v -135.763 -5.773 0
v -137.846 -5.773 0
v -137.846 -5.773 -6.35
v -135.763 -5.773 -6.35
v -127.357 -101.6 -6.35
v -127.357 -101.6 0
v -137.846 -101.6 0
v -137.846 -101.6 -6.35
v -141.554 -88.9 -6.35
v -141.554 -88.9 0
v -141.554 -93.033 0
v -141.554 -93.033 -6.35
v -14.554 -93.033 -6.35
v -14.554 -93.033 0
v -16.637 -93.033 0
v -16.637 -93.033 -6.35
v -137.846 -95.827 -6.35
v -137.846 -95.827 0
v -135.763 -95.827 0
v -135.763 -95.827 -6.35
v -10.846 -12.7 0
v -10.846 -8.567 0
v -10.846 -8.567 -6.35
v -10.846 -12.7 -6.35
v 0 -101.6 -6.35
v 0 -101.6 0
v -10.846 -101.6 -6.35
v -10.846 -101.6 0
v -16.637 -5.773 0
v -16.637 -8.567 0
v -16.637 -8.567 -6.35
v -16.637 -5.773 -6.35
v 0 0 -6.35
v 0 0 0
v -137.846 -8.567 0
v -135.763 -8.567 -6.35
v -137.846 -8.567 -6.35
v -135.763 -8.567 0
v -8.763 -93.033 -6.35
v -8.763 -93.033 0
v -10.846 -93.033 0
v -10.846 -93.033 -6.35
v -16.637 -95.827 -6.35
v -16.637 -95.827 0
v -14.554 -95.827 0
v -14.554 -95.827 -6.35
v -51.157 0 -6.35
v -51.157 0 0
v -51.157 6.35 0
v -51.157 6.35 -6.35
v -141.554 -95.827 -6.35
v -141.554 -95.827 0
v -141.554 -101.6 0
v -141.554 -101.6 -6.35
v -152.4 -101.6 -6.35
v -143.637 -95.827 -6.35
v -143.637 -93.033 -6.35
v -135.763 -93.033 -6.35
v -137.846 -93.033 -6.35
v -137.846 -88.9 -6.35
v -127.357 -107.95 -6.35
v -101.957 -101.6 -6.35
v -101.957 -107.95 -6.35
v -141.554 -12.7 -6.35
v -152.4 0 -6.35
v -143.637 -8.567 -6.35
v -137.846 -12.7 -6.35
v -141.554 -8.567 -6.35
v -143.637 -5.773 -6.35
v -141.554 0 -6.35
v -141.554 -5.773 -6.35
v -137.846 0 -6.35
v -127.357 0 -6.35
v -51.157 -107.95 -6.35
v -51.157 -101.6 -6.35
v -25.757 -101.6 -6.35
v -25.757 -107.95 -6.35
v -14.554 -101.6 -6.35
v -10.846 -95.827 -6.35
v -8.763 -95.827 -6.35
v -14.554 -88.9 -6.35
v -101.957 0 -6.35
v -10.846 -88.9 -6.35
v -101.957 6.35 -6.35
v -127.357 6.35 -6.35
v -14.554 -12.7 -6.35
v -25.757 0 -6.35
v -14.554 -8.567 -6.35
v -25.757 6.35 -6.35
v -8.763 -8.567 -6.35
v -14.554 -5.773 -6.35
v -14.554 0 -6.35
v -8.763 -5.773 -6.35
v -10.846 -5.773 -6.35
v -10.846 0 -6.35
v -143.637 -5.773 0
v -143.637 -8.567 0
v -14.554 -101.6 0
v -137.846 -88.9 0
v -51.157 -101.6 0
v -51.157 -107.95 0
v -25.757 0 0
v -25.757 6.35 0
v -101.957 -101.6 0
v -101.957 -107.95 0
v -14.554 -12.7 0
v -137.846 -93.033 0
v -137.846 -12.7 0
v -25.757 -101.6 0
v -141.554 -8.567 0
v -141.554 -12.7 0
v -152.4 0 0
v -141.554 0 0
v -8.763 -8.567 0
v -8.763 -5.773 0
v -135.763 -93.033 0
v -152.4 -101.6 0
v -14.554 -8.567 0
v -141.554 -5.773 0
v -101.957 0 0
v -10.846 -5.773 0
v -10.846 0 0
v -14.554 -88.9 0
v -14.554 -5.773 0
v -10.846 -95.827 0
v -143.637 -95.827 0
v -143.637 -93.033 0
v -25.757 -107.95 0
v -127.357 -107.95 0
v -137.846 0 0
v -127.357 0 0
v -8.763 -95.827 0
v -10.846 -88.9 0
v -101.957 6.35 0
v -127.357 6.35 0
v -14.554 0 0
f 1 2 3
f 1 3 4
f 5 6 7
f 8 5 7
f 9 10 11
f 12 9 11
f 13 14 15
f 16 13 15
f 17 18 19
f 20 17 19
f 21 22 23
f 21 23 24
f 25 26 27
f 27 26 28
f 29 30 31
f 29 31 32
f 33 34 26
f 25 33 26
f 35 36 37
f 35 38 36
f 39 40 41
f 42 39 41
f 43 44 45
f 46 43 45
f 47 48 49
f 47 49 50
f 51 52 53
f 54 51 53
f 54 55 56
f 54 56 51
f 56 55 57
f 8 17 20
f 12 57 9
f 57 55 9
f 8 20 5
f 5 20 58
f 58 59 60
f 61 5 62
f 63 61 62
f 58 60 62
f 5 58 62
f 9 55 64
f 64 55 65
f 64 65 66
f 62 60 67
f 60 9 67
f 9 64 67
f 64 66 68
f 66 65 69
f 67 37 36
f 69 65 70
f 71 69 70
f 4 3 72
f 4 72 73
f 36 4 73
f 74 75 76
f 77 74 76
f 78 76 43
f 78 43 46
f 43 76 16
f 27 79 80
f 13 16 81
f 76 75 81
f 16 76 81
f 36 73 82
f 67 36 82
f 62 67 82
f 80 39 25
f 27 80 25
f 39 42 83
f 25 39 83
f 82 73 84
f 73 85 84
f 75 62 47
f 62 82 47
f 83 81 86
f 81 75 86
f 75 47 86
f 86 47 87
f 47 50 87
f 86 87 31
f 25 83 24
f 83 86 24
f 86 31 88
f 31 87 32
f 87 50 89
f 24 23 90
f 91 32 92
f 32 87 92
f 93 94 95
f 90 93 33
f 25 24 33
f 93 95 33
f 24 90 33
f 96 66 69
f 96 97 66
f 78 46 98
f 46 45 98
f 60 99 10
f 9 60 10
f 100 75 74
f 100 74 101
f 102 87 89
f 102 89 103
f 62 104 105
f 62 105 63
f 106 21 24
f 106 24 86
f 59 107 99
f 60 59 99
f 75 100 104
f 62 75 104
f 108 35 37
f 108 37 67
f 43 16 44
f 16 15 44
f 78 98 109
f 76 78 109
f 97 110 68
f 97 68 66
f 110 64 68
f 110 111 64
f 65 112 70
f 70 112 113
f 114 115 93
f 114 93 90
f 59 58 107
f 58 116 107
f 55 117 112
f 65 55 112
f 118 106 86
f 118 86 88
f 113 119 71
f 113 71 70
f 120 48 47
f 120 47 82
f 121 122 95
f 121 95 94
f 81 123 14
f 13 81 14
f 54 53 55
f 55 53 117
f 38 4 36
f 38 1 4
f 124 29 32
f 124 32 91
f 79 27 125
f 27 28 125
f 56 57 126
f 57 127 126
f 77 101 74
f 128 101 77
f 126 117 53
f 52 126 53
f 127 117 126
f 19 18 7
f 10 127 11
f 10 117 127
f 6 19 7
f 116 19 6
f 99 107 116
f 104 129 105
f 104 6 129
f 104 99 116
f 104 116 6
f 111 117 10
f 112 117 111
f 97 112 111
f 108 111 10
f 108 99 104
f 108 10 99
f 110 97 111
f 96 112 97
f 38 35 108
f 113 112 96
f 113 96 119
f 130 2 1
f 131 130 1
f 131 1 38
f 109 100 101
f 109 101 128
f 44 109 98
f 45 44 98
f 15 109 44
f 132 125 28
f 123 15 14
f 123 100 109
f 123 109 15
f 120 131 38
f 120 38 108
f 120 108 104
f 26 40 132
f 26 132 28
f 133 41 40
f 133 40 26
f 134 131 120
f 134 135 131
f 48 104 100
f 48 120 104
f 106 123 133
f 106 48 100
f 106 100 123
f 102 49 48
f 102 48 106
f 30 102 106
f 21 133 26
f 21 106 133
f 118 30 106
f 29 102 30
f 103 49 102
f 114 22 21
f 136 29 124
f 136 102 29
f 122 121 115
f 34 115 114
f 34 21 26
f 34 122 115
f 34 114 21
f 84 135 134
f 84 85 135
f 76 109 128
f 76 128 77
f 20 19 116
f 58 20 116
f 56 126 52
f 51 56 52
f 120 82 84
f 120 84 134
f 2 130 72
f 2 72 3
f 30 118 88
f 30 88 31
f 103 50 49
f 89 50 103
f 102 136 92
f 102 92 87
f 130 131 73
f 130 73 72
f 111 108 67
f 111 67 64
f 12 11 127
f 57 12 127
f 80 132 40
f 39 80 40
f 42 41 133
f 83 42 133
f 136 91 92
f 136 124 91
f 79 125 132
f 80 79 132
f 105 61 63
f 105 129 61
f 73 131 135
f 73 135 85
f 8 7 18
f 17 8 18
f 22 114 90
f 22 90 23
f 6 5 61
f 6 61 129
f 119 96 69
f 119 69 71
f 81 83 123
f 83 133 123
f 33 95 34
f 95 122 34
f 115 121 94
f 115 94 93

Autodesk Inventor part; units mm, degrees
ref_plane "YZ Plane" through (0, 0, 0) normal (1, 0, 0) x (0, 1, 0)
ref_plane "Work Plane1" through (0, 0, 0) normal (0, 0, 1) x (1, 0, 0)
sketch "Sketch1" plane through (0, 0, 0) normal (0, 0, 1) x (1, 0, 0)
  line L0 (-77.8391, 0) -> (-108.8361, 0) projected
  line L1 (-108.8361, -33.02) -> (-108.8361, 0) projected
  line L2 (-77.8391, -33.02) -> (-108.8361, -33.02) projected
  line L3 (-77.8391, -33.02) -> (-77.8391, 0) projected
  line L4 (-152.4, 0) -> (0, 0) construction
  line L5 (-152.4, 0) -> (-152.4, 6.35) construction
  line L6 (0, 0) -> (0, 6.35) construction
  line L7 (-152.4, 0) -> (0, 0)
  line L8 (0, 0) -> (0, -101.6)
  line L9 (0, -101.6) -> (-152.4, -101.6)
  line L10 (-152.4, -101.6) -> (-152.4, 0)
  line L11 (-137.8458, 6.35) -> (-137.8458, 0)
  line L12 (-141.5542, 6.35) -> (-141.5542, 0)
  line L13 (-14.5542, 6.35) -> (-14.5542, 0)
  line L14 (-10.8458, 6.35) -> (-10.8458, 0)
  line L15 (-141.5542, 0) -> (-137.8458, 0)
  line L16 (-137.8458, 0) -> (-137.8458, -12.7)
  line L17 (-137.8458, -12.7) -> (-141.5542, -12.7)
  line L18 (-141.5542, -12.7) -> (-141.5542, 0)
  line L19 (-14.5542, 0) -> (-10.8458, 0)
  line L20 (-10.8458, 0) -> (-10.8458, -12.7)
  line L21 (-10.8458, -12.7) -> (-14.5542, -12.7)
  line L22 (-14.5542, -12.7) -> (-14.5542, 0)
  line L23 (-16.637, -5.7726) -> (-8.763, -5.7726)
  line L24 (-8.763, -5.7726) -> (-8.763, -8.5666)
  line L25 (-8.763, -8.5666) -> (-16.637, -8.5666)
  line L26 (-16.637, -8.5666) -> (-16.637, -5.7726)
  line L27 (-143.637, -5.7726) -> (-135.763, -5.7726)
  line L28 (-135.763, -5.7726) -> (-135.763, -8.5666)
  line L29 (-135.763, -8.5666) -> (-143.637, -8.5666)
  line L30 (-143.637, -8.5666) -> (-143.637, -5.7726)
  line L31 (-152.4, -50.8) -> (0, -50.8) construction
  line L32 (-137.8458, -107.95) -> (-137.8458, -101.6)
  line L33 (-141.5542, -107.95) -> (-141.5542, -101.6)
  line L34 (-14.5542, -107.95) -> (-14.5542, -101.6)
  line L35 (-10.8458, -107.95) -> (-10.8458, -101.6)
  line L36 (-141.5542, -101.6) -> (-137.8458, -101.6)
  line L37 (-137.8458, -101.6) -> (-137.8458, -88.9)
  line L38 (-137.8458, -88.9) -> (-141.5542, -88.9)
  line L39 (-141.5542, -88.9) -> (-141.5542, -101.6)
  line L40 (-14.5542, -101.6) -> (-10.8458, -101.6)
  line L41 (-10.8458, -101.6) -> (-10.8458, -88.9)
  line L42 (-10.8458, -88.9) -> (-14.5542, -88.9)
  line L43 (-14.5542, -88.9) -> (-14.5542, -101.6)
  line L44 (-16.637, -95.8274) -> (-8.763, -95.8274)
  line L45 (-8.763, -95.8274) -> (-8.763, -93.0334)
  line L46 (-8.763, -93.0334) -> (-16.637, -93.0334)
  line L47 (-16.637, -93.0334) -> (-16.637, -95.8274)
  line L48 (-143.637, -95.8274) -> (-135.763, -95.8274)
  line L49 (-135.763, -95.8274) -> (-135.763, -93.0334)
  line L50 (-135.763, -93.0334) -> (-143.637, -93.0334)
  line L51 (-143.637, -93.0334) -> (-143.637, -95.8274)
  dimension "d0" = 101.6
  dimension "d1" = 12.7
  dimension "d2" = 7.874
  dimension "d3" = 2.794
  dimension "d6" = 2.0828
  dimension "d7" = 2.0828
  dimension "d8" = 7.874
  dimension "d9" = 2.0828
  dimension "d10" = 2.0828
ref_plane "Work Plane2" through (-137.8458, 0, 0) normal (0, 1, 0) x (1, 0, 0)
sketch "Sketch2" plane through (-137.8458, 0, 0) normal (0, 1, 0) x (1, 0, 0)
  line L0 (35.8892, 0) -> (10.4892, 0) projected
  line L1 (10.4892, 0) -> (10.4892, 6.35) projected
  line L2 (10.4892, 6.35) -> (35.8892, 6.35) projected
  line L3 (35.8892, 6.35) -> (35.8892, 0) projected
  line L4 (112.0892, 0) -> (86.6892, 0) projected
  line L5 (112.0892, 6.35) -> (112.0892, 0) projected
  line L6 (86.6892, 6.35) -> (112.0892, 6.35) projected
  line L7 (86.6892, 0) -> (86.6892, 6.35) projected
  point P0 (137.8458, 0)
extrude "Extrusion2" add sketch "Sketch2" along normal blind 6.35
extrude "Extrusion3" add sketch "Sketch1" against normal blind 6.35 contours L3 L2 L1 L0 | L7 L22 L23 L26 L25 L21 L20 L24 L8 L9 L41 L44 L45 L46 L42 L43 L47 L37 L48 L49 L50 L38 L39 L51 L10 L18 L27 L30 L29 L17 L16 L28 L1 L2 L3
sketch "Sketch3" plane through (-137.8458, -101.6, 0) normal (0, -1, 0) x (1, 0, 0)
  line L0 (35.8892, 0) -> (35.8892, -6.35) projected
  line L1 (35.8892, -6.35) -> (10.4892, -6.35) projected
  line L2 (10.4892, -6.35) -> (10.4892, 0) projected
  line L3 (10.4892, 0) -> (35.8892, 0) projected
  line L4 (112.0892, 0) -> (112.0892, -6.35) projected
  line L5 (112.0892, -6.35) -> (86.6892, -6.35) projected
  line L6 (86.6892, -6.35) -> (86.6892, 0) projected
  line L7 (86.6892, 0) -> (112.0892, 0) projected
  point P0 (137.8458, 0)
extrude "Extrusion4" add sketch "Sketch3" along normal blind 6.35
equation "\"d6\" = d7"
equation "\"d9\" = d10"
properties part number "baseBoxShortSideRB01"
